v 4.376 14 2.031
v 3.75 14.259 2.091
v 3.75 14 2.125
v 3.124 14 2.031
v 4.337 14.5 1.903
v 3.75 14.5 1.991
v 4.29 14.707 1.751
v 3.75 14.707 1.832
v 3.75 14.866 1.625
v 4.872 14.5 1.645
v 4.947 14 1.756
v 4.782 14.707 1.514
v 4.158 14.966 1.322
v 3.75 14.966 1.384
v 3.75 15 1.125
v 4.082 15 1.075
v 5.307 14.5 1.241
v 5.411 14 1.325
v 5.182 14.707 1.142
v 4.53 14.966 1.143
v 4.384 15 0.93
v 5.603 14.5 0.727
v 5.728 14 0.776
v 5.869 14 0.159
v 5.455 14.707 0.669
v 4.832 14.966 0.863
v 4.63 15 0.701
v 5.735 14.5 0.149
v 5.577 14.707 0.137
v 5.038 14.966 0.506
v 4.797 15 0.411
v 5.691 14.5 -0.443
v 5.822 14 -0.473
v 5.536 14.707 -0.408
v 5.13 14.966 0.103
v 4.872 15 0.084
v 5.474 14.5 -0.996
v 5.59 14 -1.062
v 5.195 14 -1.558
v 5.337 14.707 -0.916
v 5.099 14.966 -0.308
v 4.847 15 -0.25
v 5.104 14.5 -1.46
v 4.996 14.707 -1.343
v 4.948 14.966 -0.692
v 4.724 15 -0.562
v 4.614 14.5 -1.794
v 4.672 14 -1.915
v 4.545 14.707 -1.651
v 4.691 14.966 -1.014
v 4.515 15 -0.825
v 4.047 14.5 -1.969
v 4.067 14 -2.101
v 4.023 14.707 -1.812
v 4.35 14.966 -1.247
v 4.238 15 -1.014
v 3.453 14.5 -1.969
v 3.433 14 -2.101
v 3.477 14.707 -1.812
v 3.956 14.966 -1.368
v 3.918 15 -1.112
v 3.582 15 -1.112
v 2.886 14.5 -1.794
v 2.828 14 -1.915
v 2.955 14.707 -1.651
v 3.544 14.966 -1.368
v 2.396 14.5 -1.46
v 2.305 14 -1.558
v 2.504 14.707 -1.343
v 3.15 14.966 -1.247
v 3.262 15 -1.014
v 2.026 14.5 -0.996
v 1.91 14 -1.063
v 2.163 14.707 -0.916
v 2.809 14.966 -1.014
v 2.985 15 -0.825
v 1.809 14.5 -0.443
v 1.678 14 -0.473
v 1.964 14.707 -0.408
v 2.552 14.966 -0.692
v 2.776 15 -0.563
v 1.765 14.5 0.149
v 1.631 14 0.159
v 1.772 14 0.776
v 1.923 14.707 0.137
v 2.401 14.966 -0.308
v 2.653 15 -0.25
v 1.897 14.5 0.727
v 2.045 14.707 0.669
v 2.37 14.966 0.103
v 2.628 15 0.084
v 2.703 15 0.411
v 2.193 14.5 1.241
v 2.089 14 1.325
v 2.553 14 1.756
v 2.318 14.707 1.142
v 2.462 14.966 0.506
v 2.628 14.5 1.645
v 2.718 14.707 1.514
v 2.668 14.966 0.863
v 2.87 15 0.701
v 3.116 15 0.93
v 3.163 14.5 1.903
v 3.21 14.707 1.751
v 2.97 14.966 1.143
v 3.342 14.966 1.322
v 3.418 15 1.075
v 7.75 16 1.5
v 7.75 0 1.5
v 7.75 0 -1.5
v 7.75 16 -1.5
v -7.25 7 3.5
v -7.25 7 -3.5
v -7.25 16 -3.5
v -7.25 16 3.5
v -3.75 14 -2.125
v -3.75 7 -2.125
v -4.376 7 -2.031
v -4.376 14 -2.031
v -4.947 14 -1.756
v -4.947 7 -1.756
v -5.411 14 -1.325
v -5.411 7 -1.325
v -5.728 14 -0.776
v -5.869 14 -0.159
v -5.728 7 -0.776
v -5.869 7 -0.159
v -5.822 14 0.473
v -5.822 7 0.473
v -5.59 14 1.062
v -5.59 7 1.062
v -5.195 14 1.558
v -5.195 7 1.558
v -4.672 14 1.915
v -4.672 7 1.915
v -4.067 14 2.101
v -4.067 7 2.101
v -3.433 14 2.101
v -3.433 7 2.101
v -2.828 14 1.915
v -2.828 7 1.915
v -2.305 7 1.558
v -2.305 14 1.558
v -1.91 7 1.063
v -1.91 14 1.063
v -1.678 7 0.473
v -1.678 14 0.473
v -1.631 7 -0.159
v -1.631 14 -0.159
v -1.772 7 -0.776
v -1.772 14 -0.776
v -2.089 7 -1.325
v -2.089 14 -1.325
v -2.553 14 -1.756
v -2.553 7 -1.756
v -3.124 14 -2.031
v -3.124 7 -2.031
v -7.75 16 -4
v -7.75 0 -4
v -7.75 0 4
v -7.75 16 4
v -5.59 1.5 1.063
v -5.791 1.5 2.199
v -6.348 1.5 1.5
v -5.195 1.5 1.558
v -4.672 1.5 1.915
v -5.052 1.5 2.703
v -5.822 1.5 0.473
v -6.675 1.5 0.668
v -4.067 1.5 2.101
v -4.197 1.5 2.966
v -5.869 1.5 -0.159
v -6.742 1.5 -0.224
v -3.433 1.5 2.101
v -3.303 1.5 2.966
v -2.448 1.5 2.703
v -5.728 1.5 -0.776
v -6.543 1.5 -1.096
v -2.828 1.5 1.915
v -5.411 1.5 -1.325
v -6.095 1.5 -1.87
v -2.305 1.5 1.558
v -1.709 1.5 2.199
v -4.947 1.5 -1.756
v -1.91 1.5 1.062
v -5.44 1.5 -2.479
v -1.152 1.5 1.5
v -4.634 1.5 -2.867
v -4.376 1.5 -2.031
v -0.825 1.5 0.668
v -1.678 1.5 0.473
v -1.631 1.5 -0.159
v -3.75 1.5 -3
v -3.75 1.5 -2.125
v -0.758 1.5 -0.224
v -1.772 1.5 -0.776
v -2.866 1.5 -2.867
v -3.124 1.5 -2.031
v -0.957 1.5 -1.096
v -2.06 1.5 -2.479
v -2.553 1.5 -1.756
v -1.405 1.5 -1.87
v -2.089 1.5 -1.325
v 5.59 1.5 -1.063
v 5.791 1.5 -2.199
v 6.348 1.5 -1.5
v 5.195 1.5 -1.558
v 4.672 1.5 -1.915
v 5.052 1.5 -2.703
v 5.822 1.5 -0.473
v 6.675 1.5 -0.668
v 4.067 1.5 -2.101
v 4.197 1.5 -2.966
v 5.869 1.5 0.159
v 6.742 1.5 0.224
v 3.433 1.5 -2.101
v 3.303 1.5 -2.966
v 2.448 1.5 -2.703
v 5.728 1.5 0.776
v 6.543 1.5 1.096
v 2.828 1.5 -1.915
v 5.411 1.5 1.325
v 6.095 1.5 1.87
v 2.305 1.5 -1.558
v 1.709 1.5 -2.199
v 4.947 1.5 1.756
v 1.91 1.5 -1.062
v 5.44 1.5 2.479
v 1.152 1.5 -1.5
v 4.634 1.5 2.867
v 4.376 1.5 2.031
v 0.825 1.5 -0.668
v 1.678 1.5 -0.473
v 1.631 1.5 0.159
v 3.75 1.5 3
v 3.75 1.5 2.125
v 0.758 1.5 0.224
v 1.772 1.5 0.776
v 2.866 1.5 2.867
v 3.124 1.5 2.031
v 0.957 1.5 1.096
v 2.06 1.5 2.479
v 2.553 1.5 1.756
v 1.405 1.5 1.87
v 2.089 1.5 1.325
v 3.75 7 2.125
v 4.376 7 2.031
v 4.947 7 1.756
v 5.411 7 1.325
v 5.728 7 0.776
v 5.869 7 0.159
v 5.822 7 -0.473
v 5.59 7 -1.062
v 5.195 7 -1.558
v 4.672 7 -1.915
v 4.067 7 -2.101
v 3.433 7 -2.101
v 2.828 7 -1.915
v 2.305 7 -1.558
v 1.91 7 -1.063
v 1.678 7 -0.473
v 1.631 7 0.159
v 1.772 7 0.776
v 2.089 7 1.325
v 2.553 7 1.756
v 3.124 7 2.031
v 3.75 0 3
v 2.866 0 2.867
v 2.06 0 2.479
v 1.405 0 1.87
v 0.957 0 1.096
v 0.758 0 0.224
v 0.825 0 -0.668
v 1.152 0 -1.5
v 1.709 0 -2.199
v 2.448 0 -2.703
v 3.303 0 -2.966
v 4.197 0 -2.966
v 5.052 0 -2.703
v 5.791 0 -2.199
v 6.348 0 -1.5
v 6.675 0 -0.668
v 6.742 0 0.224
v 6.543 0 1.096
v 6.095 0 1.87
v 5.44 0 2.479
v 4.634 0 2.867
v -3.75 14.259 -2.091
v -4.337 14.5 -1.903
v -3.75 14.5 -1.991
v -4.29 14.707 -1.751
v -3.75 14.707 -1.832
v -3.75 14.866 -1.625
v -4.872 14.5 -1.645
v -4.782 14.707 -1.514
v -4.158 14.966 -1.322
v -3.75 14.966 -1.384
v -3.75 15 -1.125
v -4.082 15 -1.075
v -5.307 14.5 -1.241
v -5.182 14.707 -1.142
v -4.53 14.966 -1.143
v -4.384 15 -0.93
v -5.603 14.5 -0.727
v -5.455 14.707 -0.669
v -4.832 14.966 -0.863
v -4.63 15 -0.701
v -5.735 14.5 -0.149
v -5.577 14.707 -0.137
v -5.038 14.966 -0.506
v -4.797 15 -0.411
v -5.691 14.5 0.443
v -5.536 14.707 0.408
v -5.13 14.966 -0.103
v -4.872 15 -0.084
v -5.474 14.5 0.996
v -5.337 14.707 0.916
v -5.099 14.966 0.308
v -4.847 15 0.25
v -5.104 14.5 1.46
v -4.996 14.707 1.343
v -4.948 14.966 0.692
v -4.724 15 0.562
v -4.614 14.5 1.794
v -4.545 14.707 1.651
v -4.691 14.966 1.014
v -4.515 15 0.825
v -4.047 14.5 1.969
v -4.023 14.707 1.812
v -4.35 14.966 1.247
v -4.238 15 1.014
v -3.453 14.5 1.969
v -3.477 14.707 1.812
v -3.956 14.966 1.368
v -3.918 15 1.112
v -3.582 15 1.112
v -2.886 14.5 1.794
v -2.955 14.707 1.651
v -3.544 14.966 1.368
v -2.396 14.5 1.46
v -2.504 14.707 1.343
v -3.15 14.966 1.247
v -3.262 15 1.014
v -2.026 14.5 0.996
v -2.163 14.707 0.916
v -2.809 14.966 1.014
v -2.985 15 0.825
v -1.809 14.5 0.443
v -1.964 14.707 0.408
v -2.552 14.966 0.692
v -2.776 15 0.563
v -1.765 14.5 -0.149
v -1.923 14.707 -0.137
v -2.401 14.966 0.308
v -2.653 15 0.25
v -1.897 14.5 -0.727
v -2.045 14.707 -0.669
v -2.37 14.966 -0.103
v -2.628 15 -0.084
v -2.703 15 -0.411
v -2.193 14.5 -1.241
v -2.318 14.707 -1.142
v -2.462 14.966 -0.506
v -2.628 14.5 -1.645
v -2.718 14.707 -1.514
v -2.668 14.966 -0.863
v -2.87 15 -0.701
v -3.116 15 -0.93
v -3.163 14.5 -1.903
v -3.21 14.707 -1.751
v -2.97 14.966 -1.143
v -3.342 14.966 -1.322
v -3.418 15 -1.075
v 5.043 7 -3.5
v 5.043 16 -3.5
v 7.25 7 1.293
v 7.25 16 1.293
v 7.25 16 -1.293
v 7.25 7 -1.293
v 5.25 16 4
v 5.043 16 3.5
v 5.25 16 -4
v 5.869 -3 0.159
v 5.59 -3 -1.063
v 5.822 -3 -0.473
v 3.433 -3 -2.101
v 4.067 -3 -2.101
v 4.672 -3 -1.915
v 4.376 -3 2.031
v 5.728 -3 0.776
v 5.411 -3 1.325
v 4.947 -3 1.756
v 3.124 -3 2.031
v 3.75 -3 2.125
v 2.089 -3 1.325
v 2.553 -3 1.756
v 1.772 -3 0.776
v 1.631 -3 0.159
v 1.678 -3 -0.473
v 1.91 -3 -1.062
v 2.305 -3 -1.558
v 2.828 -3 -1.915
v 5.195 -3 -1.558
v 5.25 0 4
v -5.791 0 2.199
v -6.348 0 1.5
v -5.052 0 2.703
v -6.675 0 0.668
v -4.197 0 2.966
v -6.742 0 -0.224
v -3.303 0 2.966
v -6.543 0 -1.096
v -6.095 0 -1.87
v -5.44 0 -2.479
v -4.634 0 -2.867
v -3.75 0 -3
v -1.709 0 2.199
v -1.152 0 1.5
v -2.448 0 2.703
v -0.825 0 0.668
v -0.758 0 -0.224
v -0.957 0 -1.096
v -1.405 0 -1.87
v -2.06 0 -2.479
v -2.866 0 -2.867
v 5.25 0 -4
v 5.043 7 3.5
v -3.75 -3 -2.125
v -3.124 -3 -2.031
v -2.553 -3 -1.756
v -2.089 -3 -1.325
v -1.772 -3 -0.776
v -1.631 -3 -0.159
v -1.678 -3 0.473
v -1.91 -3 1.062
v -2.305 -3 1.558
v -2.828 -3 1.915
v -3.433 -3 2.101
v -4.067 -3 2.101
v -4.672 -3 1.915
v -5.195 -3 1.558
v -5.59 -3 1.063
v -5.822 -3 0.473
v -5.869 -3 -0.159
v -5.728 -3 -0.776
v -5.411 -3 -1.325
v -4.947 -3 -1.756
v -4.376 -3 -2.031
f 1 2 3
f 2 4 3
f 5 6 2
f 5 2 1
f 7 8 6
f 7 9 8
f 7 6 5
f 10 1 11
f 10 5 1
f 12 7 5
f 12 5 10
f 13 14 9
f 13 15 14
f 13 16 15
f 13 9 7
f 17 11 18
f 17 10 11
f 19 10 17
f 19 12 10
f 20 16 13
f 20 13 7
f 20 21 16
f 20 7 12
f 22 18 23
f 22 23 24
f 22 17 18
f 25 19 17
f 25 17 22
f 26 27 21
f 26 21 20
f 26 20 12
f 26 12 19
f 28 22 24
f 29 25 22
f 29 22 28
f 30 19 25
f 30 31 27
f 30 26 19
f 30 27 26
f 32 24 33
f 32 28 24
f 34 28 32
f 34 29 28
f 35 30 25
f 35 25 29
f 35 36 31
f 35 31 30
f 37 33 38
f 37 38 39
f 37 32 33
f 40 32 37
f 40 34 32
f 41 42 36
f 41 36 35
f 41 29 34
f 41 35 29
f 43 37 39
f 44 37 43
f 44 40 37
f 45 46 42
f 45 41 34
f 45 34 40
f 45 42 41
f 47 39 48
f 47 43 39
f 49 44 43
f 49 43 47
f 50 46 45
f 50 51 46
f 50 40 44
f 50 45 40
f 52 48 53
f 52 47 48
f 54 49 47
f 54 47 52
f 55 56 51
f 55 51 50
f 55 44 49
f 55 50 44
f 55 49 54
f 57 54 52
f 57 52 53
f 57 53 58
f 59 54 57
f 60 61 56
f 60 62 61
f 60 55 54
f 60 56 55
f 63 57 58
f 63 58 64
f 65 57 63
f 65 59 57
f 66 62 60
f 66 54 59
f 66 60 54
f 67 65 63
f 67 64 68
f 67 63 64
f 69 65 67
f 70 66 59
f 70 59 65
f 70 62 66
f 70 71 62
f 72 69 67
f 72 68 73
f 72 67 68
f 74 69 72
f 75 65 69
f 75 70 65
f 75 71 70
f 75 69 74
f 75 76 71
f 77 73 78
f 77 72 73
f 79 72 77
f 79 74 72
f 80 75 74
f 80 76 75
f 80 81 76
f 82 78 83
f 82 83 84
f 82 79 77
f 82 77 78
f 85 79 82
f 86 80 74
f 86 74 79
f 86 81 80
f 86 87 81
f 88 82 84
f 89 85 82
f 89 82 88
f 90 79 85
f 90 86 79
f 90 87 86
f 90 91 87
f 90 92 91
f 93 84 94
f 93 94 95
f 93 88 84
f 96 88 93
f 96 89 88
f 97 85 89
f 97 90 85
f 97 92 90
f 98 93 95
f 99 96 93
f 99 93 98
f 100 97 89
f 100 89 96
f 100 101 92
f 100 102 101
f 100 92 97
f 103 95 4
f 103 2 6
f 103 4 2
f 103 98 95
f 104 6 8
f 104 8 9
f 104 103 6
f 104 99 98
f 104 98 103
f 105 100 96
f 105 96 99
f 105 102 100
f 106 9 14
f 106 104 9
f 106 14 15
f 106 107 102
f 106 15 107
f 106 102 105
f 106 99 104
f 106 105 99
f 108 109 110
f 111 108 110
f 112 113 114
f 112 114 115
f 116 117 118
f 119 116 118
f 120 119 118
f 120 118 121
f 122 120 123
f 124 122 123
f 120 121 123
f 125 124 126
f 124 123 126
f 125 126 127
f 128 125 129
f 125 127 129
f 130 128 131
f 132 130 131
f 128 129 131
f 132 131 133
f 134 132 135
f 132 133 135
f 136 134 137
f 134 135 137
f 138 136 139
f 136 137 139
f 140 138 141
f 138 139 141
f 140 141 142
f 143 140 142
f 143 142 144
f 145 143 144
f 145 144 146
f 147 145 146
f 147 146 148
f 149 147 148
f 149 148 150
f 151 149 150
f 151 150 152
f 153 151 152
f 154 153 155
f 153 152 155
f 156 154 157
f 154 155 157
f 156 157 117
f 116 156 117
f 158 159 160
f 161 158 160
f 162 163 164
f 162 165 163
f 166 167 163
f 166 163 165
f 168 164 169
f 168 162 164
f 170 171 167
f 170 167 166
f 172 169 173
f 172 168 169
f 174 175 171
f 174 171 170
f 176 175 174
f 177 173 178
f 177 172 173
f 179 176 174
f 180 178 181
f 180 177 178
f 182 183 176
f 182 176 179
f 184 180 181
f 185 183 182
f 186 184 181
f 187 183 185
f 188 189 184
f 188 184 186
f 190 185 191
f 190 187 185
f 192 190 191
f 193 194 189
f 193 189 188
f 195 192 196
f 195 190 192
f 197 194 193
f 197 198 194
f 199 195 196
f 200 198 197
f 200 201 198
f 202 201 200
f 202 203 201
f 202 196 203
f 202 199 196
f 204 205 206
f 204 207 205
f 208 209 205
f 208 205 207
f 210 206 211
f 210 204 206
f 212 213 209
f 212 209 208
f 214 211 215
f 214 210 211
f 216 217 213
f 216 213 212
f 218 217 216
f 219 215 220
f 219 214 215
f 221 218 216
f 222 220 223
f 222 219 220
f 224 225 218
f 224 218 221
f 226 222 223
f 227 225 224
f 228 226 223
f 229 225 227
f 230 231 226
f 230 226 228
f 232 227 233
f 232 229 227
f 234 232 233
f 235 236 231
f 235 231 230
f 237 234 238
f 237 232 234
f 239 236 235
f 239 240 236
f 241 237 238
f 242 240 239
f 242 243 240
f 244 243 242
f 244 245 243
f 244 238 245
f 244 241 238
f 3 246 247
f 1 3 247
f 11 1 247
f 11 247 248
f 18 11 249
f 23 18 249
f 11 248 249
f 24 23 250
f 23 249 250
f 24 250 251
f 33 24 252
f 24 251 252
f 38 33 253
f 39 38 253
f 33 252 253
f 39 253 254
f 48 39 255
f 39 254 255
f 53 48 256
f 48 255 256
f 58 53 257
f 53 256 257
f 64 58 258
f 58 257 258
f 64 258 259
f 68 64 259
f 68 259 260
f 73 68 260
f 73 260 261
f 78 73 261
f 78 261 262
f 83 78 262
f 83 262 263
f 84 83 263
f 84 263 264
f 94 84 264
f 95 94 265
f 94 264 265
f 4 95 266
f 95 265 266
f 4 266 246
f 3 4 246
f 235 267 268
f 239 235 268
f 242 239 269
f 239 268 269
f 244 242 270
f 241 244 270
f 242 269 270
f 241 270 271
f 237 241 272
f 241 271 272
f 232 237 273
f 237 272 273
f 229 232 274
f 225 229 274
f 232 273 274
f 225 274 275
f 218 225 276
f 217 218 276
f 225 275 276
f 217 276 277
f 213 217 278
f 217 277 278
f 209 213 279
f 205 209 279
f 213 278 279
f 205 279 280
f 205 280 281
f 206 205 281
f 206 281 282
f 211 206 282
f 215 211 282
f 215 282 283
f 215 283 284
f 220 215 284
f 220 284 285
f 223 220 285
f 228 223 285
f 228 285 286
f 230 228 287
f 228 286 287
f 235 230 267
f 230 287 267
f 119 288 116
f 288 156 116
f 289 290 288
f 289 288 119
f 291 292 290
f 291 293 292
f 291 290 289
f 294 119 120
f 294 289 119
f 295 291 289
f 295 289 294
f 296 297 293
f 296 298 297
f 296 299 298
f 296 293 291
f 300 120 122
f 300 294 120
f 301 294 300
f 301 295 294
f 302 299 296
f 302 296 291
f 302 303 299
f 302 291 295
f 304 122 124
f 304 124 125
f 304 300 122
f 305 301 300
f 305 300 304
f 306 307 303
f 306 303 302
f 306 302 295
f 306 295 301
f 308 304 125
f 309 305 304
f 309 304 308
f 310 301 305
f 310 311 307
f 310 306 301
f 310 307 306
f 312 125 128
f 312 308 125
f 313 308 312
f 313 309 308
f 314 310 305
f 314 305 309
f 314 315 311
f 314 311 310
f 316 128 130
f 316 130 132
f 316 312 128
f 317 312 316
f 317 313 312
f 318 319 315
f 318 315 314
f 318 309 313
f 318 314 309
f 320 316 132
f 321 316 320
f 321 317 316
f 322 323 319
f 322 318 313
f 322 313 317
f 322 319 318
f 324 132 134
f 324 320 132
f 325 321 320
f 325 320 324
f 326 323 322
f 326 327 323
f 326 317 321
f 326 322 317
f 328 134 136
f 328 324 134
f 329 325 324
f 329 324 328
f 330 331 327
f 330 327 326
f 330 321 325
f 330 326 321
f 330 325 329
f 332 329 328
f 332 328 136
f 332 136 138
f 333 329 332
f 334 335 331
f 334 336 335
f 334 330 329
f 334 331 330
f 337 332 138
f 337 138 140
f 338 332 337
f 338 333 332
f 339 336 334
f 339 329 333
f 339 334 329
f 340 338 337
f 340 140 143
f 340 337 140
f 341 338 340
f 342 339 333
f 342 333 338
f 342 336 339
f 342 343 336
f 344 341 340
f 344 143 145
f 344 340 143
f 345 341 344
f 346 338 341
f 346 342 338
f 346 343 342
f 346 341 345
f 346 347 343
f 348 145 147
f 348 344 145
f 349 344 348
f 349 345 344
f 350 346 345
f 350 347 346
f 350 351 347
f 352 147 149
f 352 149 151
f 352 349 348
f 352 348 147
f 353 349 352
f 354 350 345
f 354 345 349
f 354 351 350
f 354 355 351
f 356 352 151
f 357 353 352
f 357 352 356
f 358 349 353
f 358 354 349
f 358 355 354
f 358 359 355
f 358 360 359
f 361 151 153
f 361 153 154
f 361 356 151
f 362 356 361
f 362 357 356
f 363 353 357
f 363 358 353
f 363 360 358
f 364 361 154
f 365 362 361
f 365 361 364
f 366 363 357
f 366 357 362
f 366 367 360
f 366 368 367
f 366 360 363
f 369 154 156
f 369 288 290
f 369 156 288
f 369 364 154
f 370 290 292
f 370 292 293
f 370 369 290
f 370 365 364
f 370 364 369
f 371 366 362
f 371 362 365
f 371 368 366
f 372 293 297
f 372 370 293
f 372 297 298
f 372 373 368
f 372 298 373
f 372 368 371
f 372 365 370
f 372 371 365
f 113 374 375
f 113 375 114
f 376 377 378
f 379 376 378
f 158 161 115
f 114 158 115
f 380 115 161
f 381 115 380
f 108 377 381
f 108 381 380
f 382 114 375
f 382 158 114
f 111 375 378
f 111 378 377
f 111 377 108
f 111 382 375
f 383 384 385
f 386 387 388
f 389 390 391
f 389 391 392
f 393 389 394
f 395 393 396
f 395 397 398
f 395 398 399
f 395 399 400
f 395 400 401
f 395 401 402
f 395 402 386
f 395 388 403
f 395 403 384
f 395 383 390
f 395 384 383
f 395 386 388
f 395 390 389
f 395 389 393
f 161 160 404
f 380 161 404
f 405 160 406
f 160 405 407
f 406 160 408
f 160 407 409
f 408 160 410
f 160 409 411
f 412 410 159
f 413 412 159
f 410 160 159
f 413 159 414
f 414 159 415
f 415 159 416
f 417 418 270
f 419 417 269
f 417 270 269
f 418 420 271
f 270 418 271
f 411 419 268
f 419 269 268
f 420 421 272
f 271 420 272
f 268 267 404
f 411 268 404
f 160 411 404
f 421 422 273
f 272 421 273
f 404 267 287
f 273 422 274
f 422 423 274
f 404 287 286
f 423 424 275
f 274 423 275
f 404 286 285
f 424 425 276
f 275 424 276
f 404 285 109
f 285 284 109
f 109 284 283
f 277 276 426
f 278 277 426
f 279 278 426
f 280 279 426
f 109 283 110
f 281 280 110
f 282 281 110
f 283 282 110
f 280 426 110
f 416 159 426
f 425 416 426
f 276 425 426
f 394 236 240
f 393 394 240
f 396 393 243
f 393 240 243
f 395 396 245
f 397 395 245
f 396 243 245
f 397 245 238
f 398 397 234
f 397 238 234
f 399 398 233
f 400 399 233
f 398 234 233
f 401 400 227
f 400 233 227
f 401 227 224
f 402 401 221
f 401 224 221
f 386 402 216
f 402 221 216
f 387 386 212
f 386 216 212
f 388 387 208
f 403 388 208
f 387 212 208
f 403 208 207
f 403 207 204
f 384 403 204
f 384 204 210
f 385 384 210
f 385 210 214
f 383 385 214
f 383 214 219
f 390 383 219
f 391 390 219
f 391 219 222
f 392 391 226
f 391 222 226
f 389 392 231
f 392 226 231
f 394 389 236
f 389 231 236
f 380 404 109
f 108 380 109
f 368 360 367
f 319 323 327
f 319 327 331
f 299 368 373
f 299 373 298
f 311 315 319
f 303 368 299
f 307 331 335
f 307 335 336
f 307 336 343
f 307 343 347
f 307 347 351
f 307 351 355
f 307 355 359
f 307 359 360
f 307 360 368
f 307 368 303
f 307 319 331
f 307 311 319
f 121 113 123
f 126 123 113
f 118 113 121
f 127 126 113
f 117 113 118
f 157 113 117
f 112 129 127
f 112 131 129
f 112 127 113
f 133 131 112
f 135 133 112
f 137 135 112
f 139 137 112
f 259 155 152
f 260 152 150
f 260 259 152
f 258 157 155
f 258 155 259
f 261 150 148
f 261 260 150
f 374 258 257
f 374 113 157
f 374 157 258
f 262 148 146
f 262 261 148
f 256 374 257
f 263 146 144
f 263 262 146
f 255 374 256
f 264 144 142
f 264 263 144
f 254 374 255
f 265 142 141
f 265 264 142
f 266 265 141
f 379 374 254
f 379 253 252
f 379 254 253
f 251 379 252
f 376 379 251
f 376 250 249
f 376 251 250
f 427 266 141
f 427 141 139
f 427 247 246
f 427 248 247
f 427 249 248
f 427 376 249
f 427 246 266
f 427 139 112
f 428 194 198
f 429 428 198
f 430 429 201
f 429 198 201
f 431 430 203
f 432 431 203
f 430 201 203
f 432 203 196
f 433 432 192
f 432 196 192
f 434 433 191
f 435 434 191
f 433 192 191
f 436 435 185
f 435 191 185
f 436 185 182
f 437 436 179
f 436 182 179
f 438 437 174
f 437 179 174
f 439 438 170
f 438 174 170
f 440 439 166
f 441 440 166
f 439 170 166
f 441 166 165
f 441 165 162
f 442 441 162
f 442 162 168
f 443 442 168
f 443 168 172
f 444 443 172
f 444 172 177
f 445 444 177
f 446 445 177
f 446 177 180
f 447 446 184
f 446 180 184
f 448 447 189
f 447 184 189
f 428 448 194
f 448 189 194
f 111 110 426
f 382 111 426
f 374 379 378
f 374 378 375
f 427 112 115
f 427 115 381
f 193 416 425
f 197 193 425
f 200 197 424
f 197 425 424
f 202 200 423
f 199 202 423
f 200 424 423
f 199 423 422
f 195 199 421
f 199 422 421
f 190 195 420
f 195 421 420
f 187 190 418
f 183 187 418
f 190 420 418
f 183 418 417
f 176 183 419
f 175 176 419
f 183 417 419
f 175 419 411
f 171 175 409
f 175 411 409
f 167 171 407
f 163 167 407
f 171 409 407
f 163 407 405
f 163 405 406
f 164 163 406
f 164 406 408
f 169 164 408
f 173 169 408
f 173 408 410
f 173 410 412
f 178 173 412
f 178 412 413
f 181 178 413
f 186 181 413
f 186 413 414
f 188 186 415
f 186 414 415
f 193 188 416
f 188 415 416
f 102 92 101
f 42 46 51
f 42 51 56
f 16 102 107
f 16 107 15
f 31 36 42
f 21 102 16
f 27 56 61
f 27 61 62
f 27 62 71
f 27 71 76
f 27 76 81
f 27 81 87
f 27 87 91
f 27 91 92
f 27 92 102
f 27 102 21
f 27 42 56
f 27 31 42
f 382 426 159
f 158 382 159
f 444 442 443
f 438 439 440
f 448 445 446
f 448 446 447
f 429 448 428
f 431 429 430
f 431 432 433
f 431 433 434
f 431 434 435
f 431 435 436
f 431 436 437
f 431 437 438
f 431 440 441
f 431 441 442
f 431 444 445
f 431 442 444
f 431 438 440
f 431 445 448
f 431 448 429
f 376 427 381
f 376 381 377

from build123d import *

# Parameters (mm, degrees)
BOSS_EXTRUDE1_DEPTH      = 16
SHELL1_T                 = -0.5
SHELL1_THICKNESS_2_DEPTH = 6.5
SKETCH2_R                = 3
CUT_EXTRUDE1_DEPTH       = 1.5
SKETCH3_R                = 2.125
BOSS_EXTRUDE2_DEPTH      = 4.5
SKETCH4_R                = 2.125
BOSS_EXTRUDE3_DEPTH      = 8
FILLET1_R                = 1


with BuildPart() as part:
    # Sketch1 → Boss-Extrude1 (new body)
    with BuildSketch(Plane(origin=(0, 0, 0), x_dir=(1, 0, 0), z_dir=(0, 1, 0))):
        Polygon((7.75, 1.5), (5.25, 4), (-7.75, 4), (-7.75, -4), (5.25, -4), (7.75, -1.5), align=None)
    extrude(amount=BOSS_EXTRUDE1_DEPTH)

    # Shell1
    shell1_openings = [part.faces().sort_by_distance(p)[0] for p in [
        (-0.367126681, 16, 0),
    ]]
    offset(amount=SHELL1_T, openings=shell1_openings, kind=Kind.INTERSECTION)

    # Shell1 thickness 2 face (on inner face of the shell) → Shell1 thickness 2 (add)
    with BuildSketch(Plane(origin=(-0.328403857, 0.5, 0), x_dir=(0, 0, -1), z_dir=(0, -1, 0))):
        Polygon((-1.292893219, 7.578403857), (1.292893219, 7.578403857), (3.5, 5.371297076), (3.5, -6.921596143), (-3.5, -6.921596143), (-3.5, 5.371297076), align=None)
    extrude(amount=-SHELL1_THICKNESS_2_DEPTH)

    # Sketch2 → Cut-Extrude1 (cut)
    with BuildSketch(Plane.XZ):
        with Locations(Location((-3.75, 0, 0), (0, 0, 270))):
            Circle(SKETCH2_R)
        with Locations(Location((3.75, 0, 0), (0, 0, 90))):
            Circle(SKETCH2_R)
    extrude(amount=-CUT_EXTRUDE1_DEPTH, mode=Mode.SUBTRACT)

    # Sketch3 → Boss-Extrude2 (add)
    with BuildSketch(Plane.XZ.offset(-1.5)):
        with Locations(Location((-3.75, 0, 0), (0, 0, 270))):
            Circle(SKETCH3_R)
        with Locations(Location((3.75, 0, 0), (0, 0, 90))):
            Circle(SKETCH3_R)
    extrude(amount=BOSS_EXTRUDE2_DEPTH)

    # Sketch4 → Boss-Extrude3 (add)
    with BuildSketch(Plane(origin=(0, 7, 0), x_dir=(1, 0, 0), z_dir=(0, 1, 0))):
        with Locations(Location((-3.75, 0, 0), (0, 0, 90))):
            Circle(SKETCH4_R)
        with Locations(Location((3.75, 0, 0), (0, 0, 270))):
            Circle(SKETCH4_R)
    extrude(amount=BOSS_EXTRUDE3_DEPTH)

    # Fillet1
    fillet1_edges = [part.edges().sort_by_distance(p)[0] for p in [
        (-3.75, 15, 2.125),
        (3.75, 15, -2.125),
    ]]
    fillet(fillet1_edges, radius=FILLET1_R)


solid = part.part
